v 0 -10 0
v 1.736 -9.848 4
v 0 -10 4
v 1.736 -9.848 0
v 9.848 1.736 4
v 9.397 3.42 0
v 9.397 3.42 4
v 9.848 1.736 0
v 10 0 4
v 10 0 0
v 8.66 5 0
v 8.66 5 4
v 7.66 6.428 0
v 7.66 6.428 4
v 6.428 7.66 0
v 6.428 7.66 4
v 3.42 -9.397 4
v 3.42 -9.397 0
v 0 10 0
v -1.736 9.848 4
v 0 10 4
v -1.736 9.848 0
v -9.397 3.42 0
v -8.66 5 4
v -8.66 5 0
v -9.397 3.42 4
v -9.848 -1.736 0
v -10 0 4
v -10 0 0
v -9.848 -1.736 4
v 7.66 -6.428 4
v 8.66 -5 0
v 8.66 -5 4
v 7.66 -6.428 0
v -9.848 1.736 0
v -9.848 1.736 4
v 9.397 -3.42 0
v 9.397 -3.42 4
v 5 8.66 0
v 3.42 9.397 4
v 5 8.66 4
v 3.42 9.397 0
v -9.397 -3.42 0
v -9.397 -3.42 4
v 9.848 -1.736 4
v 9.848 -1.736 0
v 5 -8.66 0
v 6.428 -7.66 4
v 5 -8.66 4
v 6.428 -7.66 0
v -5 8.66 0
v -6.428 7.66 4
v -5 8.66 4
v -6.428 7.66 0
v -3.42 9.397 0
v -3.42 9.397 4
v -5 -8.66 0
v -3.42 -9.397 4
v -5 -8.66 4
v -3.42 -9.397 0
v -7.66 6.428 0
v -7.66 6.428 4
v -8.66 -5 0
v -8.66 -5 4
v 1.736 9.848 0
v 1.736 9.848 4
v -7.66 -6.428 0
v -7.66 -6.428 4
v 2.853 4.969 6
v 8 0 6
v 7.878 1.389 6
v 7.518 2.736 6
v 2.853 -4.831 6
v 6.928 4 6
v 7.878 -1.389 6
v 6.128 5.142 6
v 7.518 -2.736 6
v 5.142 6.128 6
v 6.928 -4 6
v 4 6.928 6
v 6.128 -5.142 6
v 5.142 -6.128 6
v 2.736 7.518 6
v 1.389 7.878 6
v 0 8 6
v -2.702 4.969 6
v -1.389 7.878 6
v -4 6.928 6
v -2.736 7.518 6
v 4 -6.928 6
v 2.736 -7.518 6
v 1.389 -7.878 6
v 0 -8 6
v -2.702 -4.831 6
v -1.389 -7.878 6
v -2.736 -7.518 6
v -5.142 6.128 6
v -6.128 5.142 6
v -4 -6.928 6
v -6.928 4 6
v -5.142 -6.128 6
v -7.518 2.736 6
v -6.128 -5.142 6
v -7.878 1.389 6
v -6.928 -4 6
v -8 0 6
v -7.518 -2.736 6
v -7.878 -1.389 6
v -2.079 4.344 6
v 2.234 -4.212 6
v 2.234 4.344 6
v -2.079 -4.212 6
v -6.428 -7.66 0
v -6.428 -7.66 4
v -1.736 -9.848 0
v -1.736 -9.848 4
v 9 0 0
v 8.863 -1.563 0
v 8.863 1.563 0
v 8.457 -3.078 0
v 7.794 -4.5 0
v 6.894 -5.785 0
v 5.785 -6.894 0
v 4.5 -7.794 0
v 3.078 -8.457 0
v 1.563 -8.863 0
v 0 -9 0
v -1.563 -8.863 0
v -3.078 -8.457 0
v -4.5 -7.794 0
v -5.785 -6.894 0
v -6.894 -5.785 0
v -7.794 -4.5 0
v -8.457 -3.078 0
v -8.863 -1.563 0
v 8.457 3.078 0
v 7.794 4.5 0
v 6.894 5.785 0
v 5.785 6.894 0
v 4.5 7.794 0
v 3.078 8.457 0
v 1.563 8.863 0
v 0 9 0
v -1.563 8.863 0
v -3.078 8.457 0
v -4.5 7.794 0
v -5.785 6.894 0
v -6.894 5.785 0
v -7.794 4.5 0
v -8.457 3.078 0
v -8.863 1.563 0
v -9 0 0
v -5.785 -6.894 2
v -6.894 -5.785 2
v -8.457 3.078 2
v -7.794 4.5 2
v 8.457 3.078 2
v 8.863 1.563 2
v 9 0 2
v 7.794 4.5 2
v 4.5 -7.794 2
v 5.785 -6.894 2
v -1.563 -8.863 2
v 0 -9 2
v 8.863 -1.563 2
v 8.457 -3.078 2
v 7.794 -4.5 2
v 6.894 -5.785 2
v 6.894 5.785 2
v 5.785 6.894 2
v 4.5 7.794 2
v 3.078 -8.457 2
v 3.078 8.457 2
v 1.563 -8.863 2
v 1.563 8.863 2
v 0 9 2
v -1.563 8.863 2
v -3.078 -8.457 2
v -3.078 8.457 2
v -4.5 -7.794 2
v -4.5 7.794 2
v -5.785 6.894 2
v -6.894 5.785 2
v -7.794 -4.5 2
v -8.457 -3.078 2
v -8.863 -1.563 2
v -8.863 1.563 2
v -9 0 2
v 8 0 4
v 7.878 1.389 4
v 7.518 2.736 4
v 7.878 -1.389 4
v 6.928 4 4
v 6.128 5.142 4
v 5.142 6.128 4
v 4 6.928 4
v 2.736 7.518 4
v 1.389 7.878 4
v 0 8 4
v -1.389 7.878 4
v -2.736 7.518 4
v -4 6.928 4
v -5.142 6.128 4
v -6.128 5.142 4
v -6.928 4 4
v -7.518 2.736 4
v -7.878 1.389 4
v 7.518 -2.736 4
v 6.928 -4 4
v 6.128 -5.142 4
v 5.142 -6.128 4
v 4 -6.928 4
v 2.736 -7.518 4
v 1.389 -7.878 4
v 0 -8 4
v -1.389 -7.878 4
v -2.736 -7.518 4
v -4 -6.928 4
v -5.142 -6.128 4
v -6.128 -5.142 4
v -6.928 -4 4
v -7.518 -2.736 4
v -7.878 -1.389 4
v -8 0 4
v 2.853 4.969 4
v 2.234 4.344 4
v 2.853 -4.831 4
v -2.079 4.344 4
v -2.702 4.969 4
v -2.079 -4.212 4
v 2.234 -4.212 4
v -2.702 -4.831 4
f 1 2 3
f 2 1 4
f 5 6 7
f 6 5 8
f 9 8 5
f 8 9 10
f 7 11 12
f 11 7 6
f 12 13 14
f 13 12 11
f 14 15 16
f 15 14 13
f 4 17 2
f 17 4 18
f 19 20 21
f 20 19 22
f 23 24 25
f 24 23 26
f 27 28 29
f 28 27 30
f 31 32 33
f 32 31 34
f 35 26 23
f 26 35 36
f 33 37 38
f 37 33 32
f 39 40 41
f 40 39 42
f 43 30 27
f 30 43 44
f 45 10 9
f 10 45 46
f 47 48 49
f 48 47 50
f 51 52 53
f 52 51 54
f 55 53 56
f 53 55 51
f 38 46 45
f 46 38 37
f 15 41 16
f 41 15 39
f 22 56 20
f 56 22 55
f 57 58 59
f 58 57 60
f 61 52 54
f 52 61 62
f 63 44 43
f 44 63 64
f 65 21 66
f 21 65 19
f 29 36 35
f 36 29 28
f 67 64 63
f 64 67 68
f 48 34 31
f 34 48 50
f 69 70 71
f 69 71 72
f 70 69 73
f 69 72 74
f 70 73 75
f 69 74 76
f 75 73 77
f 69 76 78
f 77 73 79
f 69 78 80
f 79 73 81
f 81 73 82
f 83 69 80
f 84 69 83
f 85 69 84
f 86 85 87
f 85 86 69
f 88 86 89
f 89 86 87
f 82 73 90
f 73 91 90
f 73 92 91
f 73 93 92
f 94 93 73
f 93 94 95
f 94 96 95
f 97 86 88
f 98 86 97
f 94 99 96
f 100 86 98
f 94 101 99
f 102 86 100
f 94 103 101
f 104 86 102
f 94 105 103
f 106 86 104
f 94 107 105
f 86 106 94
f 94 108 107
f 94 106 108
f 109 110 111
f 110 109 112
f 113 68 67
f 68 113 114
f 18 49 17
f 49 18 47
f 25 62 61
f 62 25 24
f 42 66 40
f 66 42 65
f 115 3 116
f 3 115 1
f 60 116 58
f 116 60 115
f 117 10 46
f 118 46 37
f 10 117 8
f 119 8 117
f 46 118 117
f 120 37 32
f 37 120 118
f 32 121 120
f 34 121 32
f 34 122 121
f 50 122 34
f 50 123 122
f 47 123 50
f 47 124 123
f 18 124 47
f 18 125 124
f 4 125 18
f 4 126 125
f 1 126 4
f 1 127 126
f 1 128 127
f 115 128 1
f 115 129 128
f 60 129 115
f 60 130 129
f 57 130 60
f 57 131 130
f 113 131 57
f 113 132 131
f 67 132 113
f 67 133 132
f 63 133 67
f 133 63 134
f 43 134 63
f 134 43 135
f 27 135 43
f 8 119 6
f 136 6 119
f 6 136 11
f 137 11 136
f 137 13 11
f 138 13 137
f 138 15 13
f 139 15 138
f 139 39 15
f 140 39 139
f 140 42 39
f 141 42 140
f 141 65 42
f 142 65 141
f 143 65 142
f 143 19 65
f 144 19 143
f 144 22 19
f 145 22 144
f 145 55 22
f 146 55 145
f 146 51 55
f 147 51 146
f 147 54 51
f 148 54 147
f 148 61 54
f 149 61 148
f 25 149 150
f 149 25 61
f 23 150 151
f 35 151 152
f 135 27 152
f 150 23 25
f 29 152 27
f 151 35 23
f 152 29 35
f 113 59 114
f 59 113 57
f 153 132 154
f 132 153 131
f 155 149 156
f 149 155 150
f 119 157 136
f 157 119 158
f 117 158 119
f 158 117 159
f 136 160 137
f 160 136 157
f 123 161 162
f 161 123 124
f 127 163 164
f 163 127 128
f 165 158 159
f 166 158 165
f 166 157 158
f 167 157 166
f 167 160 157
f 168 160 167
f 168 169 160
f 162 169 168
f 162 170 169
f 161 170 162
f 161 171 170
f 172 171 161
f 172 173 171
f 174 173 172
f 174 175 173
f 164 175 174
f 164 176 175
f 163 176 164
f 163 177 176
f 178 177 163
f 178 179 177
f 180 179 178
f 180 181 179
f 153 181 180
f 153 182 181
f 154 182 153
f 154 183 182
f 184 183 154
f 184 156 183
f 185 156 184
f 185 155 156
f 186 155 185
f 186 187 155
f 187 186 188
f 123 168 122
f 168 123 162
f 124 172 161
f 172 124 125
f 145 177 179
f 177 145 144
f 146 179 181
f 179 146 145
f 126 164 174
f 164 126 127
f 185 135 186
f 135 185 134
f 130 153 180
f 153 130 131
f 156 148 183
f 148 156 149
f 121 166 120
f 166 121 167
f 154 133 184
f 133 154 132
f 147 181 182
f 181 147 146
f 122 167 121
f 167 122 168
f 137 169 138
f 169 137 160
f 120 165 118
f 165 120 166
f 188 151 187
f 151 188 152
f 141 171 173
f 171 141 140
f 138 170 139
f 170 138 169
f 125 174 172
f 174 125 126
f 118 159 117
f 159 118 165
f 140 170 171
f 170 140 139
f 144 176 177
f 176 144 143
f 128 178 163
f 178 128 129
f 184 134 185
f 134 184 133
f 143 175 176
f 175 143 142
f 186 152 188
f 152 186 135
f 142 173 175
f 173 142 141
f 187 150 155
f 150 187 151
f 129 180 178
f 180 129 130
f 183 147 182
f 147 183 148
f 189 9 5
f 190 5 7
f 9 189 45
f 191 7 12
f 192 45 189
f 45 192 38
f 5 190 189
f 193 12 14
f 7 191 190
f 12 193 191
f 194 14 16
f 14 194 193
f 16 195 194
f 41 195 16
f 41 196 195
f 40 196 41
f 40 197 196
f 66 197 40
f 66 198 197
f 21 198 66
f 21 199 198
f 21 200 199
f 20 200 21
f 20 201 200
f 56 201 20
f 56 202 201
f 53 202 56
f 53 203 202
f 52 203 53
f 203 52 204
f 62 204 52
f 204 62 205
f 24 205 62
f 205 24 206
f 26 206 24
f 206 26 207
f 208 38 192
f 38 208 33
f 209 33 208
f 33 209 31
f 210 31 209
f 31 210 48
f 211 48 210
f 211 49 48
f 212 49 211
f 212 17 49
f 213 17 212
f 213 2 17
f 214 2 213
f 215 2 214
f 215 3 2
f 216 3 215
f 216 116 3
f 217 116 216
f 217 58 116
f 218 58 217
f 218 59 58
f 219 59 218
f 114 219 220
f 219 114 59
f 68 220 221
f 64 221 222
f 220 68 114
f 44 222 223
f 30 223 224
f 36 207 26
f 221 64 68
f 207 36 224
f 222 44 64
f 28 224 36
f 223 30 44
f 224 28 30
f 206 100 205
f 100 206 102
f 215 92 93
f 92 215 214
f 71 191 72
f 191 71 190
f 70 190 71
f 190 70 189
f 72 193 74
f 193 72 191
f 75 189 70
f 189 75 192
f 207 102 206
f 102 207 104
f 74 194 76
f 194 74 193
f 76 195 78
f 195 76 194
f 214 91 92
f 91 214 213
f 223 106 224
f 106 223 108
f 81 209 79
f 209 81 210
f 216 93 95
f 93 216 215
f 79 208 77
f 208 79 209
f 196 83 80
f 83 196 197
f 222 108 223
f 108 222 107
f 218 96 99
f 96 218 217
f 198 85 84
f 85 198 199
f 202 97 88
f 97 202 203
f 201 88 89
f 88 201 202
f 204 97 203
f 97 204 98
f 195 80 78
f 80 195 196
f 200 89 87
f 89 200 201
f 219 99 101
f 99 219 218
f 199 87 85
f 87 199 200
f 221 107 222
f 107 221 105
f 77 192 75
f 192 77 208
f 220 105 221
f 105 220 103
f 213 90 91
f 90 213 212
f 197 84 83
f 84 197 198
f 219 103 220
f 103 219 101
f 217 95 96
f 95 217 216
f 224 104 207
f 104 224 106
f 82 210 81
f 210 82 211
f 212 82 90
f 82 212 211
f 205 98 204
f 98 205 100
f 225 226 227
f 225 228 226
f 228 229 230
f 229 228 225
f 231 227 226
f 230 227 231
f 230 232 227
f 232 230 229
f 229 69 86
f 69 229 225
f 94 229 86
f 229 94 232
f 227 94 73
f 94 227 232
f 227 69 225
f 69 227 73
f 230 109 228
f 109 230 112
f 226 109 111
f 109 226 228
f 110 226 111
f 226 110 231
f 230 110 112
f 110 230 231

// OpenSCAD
difference() {
	difference() {
		difference() {
			cylinder($fn = 36, h = 6, r = 10);
			translate(v = [0, 0, -1]) {
				cylinder($fn = 36, h = 3, r = 9);
			}
		}
		translate(v = [0, 0, 4]) {
			difference() {
				cylinder($fn = 36, h = 3, r = 10.5000000000);
				cylinder($fn = 36, h = 3, r = 8);
			}
		}
	}
	translate(v = [0, 0, 4]) {
		linear_extrude(height = 3) {
			text(font = "mana", halign = "center", size = 8, text = "\uE600", valign = "center");
		}
	}
}
